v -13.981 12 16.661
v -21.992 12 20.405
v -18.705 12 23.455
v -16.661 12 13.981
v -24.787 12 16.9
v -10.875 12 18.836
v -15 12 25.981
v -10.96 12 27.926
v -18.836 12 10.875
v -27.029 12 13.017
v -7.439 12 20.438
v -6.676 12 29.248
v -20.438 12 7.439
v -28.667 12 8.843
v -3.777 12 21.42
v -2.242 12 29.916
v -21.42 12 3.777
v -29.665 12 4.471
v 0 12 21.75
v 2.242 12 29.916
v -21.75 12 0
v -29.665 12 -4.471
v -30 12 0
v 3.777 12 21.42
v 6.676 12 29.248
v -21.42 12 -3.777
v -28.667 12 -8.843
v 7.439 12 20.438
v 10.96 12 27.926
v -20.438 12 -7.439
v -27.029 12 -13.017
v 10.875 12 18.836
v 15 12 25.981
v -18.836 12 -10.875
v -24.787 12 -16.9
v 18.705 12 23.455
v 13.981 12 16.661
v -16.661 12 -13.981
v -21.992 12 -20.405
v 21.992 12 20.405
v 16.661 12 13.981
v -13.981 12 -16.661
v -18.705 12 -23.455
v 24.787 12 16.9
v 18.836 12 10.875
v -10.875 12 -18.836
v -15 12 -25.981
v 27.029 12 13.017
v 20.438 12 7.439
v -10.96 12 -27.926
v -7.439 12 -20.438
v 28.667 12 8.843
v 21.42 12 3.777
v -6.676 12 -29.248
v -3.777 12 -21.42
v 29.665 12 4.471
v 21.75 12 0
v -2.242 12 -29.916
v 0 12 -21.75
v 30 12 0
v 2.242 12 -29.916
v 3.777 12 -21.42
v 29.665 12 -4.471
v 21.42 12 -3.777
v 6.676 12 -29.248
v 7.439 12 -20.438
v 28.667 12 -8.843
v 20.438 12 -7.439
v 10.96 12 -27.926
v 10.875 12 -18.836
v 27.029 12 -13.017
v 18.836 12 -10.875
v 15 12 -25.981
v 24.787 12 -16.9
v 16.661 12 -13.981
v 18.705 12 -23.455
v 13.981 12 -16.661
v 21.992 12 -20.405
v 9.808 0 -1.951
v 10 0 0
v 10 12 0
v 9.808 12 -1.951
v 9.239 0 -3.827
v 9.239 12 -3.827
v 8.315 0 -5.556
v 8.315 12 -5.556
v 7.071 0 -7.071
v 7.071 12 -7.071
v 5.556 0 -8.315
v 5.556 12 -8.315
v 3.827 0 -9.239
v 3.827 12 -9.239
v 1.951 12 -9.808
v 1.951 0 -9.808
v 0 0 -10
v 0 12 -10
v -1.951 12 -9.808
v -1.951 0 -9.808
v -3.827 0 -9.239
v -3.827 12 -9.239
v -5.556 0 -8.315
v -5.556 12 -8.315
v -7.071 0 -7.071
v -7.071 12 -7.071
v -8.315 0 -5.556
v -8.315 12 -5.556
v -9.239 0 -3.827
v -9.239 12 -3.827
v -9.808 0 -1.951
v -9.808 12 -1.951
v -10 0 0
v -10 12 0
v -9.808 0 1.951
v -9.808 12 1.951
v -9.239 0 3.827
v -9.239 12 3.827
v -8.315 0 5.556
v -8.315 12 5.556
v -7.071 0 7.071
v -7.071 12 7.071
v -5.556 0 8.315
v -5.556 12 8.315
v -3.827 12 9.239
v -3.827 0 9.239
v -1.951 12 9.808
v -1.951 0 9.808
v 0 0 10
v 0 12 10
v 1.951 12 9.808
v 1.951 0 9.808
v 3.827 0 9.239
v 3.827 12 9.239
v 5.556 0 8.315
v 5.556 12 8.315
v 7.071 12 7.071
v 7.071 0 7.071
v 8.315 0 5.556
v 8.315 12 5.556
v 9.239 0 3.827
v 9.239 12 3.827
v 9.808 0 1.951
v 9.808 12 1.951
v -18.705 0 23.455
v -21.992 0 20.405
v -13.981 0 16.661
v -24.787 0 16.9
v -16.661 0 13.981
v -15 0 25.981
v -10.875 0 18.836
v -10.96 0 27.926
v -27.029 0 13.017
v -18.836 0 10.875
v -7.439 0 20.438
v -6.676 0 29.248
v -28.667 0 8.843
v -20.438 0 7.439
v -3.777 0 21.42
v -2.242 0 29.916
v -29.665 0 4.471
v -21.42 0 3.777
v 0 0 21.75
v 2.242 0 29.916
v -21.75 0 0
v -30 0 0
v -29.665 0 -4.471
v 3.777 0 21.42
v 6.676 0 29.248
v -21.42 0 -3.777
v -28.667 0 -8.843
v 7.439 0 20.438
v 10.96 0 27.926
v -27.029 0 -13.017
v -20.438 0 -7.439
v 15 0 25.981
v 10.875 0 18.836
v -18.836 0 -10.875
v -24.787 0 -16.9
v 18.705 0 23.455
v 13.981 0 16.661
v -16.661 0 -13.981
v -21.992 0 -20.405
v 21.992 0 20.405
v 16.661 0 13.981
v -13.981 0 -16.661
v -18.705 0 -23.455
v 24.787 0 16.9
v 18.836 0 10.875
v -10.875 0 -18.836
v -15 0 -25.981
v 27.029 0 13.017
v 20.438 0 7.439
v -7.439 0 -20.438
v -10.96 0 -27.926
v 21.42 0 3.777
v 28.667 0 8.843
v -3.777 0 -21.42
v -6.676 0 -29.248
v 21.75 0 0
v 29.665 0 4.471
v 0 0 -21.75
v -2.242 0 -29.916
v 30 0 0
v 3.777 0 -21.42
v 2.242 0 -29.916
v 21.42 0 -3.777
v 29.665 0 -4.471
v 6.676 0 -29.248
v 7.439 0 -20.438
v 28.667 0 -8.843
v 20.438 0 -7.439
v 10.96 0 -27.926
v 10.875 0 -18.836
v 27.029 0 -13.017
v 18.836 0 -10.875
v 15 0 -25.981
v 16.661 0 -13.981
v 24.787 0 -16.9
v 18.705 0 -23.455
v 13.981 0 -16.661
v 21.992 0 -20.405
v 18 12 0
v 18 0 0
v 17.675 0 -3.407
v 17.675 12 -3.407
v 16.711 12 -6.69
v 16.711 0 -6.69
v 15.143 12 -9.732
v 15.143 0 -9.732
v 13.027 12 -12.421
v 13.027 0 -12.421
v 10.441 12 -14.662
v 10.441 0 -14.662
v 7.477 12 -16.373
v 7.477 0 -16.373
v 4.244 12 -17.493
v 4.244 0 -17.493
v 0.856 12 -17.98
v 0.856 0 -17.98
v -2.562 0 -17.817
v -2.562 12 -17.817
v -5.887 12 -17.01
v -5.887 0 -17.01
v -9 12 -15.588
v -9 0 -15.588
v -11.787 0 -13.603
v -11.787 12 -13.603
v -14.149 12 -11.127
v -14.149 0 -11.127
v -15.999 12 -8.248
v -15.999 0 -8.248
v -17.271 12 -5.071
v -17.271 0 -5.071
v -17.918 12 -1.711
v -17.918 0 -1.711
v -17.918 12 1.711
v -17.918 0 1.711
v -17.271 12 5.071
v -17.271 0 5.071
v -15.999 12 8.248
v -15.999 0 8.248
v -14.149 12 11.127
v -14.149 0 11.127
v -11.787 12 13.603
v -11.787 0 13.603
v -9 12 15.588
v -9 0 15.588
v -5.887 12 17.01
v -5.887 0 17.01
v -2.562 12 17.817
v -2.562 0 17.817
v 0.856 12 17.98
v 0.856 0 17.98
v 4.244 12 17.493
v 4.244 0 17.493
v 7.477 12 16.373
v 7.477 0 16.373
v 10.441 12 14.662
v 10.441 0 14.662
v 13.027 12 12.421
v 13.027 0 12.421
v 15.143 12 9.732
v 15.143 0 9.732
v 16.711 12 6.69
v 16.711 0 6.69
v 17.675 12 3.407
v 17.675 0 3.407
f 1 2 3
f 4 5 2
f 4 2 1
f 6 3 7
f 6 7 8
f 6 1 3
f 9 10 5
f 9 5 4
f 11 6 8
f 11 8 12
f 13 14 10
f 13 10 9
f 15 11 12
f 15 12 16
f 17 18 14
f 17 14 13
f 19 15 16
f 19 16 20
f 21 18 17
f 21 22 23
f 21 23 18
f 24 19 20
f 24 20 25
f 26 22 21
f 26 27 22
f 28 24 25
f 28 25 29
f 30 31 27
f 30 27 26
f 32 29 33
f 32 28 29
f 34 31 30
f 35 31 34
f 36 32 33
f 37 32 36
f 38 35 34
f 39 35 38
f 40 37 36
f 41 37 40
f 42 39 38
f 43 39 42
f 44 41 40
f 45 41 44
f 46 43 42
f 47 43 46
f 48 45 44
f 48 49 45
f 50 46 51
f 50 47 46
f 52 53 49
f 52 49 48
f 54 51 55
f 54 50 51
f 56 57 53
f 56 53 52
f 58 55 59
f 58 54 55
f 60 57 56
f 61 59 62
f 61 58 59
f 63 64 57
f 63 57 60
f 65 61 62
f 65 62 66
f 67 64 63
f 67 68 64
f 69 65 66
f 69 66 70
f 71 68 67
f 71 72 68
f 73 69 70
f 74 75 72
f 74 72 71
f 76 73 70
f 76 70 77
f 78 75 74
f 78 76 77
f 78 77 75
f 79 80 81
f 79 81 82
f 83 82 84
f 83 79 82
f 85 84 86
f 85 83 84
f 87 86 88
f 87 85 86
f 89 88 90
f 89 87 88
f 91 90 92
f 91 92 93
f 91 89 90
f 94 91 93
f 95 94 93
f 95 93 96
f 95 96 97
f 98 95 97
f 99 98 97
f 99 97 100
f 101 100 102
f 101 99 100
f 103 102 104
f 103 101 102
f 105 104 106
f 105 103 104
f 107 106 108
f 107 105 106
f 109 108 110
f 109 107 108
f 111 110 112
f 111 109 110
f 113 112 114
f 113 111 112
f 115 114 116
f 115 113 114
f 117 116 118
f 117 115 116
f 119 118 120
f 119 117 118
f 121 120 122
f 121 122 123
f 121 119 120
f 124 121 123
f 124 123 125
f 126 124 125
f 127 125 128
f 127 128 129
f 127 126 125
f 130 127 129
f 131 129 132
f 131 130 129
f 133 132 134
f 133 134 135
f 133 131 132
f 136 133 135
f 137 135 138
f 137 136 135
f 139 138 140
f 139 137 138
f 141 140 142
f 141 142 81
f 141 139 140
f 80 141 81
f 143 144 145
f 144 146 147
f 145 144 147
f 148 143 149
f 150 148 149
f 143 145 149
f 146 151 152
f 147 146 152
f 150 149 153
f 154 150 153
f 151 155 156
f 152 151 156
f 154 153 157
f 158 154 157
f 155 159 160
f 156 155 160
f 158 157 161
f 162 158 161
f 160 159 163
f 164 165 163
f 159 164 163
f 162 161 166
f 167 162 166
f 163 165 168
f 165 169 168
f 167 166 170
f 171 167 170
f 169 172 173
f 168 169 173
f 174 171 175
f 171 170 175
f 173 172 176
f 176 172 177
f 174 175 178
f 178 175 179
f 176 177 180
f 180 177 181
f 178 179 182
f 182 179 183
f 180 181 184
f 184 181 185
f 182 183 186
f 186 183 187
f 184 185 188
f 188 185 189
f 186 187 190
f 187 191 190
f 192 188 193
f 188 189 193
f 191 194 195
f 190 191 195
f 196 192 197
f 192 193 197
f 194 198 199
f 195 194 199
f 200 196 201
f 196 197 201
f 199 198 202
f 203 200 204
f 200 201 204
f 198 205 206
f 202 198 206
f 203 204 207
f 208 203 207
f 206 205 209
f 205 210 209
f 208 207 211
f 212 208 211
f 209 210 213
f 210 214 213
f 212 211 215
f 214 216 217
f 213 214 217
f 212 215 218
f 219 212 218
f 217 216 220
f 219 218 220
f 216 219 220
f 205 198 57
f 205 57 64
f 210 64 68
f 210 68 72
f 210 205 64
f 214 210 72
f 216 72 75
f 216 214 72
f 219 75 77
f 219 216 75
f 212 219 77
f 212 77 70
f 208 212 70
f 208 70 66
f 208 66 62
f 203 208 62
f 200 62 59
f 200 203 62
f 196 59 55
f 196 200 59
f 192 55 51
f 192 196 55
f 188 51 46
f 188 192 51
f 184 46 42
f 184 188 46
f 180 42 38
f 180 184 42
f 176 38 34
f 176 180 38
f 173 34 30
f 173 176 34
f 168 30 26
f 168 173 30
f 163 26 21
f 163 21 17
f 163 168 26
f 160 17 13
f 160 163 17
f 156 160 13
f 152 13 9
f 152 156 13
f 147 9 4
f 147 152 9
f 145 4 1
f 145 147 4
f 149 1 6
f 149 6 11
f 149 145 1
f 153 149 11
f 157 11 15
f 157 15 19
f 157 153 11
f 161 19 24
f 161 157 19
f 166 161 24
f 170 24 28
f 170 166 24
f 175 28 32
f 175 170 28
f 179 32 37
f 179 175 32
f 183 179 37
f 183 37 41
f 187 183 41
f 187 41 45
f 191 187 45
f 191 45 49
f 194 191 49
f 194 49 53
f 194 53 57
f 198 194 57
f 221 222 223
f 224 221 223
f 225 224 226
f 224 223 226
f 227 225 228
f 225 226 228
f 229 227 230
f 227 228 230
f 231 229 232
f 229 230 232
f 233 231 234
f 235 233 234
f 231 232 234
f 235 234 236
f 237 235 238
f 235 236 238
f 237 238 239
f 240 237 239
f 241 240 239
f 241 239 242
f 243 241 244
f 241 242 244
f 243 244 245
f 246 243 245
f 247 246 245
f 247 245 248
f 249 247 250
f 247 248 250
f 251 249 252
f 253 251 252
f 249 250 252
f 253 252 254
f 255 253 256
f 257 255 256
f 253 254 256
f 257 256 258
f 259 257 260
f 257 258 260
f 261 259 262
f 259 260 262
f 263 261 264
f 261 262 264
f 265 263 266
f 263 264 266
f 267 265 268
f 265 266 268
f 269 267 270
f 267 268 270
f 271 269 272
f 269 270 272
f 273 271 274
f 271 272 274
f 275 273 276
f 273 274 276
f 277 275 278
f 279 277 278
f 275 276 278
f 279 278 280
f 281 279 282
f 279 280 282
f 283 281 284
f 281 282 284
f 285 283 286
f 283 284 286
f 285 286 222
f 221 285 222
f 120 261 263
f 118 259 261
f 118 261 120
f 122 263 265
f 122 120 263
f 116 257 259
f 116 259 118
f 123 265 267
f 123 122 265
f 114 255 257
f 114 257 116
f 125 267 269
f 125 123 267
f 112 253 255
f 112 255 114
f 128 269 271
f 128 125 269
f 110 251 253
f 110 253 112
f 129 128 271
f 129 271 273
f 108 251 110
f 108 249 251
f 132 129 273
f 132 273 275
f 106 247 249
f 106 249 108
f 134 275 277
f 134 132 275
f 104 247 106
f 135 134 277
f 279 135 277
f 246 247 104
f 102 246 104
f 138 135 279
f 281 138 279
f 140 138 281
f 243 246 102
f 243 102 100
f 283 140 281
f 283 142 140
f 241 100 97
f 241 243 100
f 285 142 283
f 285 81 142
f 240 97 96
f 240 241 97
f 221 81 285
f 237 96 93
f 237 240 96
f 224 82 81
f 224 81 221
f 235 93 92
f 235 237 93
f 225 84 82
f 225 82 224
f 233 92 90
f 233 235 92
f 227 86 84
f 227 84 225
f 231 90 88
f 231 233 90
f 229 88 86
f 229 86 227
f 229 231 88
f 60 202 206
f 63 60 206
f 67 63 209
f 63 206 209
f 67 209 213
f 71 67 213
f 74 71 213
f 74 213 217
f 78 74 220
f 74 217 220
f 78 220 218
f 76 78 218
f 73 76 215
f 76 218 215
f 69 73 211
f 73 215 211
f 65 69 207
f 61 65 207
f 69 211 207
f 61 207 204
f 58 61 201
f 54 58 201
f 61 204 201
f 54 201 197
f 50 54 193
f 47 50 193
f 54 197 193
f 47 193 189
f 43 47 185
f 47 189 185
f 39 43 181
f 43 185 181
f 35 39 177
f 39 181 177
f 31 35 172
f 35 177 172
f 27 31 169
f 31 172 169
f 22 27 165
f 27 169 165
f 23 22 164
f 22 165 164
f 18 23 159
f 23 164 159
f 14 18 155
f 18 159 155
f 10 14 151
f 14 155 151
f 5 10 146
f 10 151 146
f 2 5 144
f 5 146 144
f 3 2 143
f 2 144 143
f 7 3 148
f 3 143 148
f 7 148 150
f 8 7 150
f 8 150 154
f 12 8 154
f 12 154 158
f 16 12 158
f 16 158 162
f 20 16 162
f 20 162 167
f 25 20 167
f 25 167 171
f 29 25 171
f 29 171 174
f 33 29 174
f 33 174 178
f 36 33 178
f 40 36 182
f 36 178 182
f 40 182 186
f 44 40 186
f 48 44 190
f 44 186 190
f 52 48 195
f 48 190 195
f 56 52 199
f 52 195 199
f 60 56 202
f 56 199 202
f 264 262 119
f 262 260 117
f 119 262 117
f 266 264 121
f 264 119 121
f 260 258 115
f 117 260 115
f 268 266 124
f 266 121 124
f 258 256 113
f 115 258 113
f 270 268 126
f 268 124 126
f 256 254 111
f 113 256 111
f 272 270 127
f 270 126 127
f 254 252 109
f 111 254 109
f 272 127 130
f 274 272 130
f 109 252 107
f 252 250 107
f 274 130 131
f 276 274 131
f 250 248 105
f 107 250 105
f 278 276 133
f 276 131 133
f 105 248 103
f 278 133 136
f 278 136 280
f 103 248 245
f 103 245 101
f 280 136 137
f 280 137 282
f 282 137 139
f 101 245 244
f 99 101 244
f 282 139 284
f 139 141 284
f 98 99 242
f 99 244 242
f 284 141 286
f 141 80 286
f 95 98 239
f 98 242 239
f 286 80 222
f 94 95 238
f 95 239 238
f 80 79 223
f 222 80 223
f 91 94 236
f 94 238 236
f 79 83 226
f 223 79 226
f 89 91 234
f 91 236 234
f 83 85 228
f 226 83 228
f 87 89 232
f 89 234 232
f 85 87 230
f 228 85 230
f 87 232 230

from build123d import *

# Parameters (mm, degrees)
SKETCH1_R           = 18
SKETCH1_R_2         = 10
BOSS_EXTRUDE1_DEPTH = 12
SKETCH2_R           = 30
SKETCH2_R_2         = 21.75
BOSS_EXTRUDE2_DEPTH = 12


with BuildPart() as part:
    # Sketch1 → Boss-Extrude1 (new body)
    with BuildSketch(Plane(origin=(0, 0, 0), x_dir=(1, 0, 0), z_dir=(0, 1, 0))):
        Circle(SKETCH1_R)
        Circle(SKETCH1_R_2, mode=Mode.SUBTRACT)
    extrude(amount=BOSS_EXTRUDE1_DEPTH)


with BuildPart() as body_2:
    # Sketch2 → Boss-Extrude2 (new body)
    with BuildSketch(Plane(origin=(0, 0, 0), x_dir=(1, 0, 0), z_dir=(0, 1, 0))):
        Circle(SKETCH2_R)
        Circle(SKETCH2_R_2, mode=Mode.SUBTRACT)
    extrude(amount=BOSS_EXTRUDE2_DEPTH)


solid = Compound([part.part, body_2.part])
